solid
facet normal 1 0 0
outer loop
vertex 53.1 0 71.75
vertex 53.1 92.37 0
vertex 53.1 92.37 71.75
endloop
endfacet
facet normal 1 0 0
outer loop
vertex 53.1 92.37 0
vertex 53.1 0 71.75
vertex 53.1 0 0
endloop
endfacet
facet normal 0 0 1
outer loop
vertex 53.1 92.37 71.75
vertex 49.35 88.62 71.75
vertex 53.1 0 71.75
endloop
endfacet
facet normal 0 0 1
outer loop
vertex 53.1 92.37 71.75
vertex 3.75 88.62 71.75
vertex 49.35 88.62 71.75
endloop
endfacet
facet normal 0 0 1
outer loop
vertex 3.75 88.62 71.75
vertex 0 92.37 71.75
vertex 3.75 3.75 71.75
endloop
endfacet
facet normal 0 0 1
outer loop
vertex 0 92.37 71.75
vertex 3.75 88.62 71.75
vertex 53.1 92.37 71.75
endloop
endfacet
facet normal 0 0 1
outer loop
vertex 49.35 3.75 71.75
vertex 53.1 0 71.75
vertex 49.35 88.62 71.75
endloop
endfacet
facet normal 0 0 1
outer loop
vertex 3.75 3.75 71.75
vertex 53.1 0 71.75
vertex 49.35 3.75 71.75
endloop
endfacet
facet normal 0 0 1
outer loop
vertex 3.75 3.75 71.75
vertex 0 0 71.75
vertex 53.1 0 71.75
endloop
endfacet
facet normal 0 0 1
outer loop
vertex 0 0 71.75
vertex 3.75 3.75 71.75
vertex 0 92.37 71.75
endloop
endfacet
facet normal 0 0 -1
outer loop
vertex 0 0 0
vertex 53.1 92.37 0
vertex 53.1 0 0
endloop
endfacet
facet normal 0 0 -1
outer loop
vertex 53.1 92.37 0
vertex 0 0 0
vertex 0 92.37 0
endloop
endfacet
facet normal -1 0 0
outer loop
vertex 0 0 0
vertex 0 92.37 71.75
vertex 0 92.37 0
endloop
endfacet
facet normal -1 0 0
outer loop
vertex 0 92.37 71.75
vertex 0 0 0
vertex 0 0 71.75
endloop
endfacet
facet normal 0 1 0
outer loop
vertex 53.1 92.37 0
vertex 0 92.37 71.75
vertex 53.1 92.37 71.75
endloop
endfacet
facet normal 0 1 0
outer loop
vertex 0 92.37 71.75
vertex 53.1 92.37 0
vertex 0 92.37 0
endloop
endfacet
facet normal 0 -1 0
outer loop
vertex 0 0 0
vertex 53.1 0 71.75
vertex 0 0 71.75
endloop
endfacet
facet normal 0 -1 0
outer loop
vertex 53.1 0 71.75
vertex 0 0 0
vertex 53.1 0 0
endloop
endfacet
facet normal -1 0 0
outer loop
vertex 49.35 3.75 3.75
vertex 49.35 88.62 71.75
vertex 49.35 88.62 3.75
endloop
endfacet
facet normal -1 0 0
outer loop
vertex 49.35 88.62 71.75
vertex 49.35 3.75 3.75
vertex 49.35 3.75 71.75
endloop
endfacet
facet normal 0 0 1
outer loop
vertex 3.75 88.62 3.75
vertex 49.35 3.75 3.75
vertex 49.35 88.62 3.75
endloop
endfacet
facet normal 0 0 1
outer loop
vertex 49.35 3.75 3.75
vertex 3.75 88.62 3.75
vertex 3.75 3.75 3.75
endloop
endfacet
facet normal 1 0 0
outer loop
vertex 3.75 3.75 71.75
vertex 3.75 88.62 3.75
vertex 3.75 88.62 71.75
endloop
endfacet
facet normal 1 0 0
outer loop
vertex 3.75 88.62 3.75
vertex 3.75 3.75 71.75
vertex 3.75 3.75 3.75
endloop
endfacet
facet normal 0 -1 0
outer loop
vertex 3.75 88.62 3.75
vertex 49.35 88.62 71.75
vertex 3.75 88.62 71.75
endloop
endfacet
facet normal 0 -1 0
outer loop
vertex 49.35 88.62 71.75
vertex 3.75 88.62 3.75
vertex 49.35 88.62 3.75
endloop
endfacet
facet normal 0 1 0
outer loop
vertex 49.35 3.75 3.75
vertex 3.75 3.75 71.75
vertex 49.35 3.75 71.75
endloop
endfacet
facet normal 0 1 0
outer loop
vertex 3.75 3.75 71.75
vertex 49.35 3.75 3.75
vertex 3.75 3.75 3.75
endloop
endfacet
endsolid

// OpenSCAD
// Wall thickness of the box
wall_thickness = 3.75;

// Dimensions of the 4 blade-holders, stacked, plus 0.1 for 3D Printer tolerance fit
tolerance = 0.1;
cutout_width = 45.50 + tolerance;
cutout_depth = 84.77 + tolerance;
height = 68 + wall_thickness;

// Calculating the outer dimensions of the box
width = cutout_width + 2 * wall_thickness;
depth = cutout_depth + 2 * wall_thickness;

// Main box body
difference() {
  // Outer box
  cube([width, depth, height]);

  // Inner box
  translate([wall_thickness, wall_thickness, wall_thickness]) {
    cube([width - 2 * wall_thickness, depth - 2 * wall_thickness, height - 2 * wall_thickness]);
  }

  // Blade cutout
  translate([(width - cutout_width) / 2, (depth - cutout_depth) / 2, height - wall_thickness]) {
    cube([cutout_width, cutout_depth, height]);
  }
}
